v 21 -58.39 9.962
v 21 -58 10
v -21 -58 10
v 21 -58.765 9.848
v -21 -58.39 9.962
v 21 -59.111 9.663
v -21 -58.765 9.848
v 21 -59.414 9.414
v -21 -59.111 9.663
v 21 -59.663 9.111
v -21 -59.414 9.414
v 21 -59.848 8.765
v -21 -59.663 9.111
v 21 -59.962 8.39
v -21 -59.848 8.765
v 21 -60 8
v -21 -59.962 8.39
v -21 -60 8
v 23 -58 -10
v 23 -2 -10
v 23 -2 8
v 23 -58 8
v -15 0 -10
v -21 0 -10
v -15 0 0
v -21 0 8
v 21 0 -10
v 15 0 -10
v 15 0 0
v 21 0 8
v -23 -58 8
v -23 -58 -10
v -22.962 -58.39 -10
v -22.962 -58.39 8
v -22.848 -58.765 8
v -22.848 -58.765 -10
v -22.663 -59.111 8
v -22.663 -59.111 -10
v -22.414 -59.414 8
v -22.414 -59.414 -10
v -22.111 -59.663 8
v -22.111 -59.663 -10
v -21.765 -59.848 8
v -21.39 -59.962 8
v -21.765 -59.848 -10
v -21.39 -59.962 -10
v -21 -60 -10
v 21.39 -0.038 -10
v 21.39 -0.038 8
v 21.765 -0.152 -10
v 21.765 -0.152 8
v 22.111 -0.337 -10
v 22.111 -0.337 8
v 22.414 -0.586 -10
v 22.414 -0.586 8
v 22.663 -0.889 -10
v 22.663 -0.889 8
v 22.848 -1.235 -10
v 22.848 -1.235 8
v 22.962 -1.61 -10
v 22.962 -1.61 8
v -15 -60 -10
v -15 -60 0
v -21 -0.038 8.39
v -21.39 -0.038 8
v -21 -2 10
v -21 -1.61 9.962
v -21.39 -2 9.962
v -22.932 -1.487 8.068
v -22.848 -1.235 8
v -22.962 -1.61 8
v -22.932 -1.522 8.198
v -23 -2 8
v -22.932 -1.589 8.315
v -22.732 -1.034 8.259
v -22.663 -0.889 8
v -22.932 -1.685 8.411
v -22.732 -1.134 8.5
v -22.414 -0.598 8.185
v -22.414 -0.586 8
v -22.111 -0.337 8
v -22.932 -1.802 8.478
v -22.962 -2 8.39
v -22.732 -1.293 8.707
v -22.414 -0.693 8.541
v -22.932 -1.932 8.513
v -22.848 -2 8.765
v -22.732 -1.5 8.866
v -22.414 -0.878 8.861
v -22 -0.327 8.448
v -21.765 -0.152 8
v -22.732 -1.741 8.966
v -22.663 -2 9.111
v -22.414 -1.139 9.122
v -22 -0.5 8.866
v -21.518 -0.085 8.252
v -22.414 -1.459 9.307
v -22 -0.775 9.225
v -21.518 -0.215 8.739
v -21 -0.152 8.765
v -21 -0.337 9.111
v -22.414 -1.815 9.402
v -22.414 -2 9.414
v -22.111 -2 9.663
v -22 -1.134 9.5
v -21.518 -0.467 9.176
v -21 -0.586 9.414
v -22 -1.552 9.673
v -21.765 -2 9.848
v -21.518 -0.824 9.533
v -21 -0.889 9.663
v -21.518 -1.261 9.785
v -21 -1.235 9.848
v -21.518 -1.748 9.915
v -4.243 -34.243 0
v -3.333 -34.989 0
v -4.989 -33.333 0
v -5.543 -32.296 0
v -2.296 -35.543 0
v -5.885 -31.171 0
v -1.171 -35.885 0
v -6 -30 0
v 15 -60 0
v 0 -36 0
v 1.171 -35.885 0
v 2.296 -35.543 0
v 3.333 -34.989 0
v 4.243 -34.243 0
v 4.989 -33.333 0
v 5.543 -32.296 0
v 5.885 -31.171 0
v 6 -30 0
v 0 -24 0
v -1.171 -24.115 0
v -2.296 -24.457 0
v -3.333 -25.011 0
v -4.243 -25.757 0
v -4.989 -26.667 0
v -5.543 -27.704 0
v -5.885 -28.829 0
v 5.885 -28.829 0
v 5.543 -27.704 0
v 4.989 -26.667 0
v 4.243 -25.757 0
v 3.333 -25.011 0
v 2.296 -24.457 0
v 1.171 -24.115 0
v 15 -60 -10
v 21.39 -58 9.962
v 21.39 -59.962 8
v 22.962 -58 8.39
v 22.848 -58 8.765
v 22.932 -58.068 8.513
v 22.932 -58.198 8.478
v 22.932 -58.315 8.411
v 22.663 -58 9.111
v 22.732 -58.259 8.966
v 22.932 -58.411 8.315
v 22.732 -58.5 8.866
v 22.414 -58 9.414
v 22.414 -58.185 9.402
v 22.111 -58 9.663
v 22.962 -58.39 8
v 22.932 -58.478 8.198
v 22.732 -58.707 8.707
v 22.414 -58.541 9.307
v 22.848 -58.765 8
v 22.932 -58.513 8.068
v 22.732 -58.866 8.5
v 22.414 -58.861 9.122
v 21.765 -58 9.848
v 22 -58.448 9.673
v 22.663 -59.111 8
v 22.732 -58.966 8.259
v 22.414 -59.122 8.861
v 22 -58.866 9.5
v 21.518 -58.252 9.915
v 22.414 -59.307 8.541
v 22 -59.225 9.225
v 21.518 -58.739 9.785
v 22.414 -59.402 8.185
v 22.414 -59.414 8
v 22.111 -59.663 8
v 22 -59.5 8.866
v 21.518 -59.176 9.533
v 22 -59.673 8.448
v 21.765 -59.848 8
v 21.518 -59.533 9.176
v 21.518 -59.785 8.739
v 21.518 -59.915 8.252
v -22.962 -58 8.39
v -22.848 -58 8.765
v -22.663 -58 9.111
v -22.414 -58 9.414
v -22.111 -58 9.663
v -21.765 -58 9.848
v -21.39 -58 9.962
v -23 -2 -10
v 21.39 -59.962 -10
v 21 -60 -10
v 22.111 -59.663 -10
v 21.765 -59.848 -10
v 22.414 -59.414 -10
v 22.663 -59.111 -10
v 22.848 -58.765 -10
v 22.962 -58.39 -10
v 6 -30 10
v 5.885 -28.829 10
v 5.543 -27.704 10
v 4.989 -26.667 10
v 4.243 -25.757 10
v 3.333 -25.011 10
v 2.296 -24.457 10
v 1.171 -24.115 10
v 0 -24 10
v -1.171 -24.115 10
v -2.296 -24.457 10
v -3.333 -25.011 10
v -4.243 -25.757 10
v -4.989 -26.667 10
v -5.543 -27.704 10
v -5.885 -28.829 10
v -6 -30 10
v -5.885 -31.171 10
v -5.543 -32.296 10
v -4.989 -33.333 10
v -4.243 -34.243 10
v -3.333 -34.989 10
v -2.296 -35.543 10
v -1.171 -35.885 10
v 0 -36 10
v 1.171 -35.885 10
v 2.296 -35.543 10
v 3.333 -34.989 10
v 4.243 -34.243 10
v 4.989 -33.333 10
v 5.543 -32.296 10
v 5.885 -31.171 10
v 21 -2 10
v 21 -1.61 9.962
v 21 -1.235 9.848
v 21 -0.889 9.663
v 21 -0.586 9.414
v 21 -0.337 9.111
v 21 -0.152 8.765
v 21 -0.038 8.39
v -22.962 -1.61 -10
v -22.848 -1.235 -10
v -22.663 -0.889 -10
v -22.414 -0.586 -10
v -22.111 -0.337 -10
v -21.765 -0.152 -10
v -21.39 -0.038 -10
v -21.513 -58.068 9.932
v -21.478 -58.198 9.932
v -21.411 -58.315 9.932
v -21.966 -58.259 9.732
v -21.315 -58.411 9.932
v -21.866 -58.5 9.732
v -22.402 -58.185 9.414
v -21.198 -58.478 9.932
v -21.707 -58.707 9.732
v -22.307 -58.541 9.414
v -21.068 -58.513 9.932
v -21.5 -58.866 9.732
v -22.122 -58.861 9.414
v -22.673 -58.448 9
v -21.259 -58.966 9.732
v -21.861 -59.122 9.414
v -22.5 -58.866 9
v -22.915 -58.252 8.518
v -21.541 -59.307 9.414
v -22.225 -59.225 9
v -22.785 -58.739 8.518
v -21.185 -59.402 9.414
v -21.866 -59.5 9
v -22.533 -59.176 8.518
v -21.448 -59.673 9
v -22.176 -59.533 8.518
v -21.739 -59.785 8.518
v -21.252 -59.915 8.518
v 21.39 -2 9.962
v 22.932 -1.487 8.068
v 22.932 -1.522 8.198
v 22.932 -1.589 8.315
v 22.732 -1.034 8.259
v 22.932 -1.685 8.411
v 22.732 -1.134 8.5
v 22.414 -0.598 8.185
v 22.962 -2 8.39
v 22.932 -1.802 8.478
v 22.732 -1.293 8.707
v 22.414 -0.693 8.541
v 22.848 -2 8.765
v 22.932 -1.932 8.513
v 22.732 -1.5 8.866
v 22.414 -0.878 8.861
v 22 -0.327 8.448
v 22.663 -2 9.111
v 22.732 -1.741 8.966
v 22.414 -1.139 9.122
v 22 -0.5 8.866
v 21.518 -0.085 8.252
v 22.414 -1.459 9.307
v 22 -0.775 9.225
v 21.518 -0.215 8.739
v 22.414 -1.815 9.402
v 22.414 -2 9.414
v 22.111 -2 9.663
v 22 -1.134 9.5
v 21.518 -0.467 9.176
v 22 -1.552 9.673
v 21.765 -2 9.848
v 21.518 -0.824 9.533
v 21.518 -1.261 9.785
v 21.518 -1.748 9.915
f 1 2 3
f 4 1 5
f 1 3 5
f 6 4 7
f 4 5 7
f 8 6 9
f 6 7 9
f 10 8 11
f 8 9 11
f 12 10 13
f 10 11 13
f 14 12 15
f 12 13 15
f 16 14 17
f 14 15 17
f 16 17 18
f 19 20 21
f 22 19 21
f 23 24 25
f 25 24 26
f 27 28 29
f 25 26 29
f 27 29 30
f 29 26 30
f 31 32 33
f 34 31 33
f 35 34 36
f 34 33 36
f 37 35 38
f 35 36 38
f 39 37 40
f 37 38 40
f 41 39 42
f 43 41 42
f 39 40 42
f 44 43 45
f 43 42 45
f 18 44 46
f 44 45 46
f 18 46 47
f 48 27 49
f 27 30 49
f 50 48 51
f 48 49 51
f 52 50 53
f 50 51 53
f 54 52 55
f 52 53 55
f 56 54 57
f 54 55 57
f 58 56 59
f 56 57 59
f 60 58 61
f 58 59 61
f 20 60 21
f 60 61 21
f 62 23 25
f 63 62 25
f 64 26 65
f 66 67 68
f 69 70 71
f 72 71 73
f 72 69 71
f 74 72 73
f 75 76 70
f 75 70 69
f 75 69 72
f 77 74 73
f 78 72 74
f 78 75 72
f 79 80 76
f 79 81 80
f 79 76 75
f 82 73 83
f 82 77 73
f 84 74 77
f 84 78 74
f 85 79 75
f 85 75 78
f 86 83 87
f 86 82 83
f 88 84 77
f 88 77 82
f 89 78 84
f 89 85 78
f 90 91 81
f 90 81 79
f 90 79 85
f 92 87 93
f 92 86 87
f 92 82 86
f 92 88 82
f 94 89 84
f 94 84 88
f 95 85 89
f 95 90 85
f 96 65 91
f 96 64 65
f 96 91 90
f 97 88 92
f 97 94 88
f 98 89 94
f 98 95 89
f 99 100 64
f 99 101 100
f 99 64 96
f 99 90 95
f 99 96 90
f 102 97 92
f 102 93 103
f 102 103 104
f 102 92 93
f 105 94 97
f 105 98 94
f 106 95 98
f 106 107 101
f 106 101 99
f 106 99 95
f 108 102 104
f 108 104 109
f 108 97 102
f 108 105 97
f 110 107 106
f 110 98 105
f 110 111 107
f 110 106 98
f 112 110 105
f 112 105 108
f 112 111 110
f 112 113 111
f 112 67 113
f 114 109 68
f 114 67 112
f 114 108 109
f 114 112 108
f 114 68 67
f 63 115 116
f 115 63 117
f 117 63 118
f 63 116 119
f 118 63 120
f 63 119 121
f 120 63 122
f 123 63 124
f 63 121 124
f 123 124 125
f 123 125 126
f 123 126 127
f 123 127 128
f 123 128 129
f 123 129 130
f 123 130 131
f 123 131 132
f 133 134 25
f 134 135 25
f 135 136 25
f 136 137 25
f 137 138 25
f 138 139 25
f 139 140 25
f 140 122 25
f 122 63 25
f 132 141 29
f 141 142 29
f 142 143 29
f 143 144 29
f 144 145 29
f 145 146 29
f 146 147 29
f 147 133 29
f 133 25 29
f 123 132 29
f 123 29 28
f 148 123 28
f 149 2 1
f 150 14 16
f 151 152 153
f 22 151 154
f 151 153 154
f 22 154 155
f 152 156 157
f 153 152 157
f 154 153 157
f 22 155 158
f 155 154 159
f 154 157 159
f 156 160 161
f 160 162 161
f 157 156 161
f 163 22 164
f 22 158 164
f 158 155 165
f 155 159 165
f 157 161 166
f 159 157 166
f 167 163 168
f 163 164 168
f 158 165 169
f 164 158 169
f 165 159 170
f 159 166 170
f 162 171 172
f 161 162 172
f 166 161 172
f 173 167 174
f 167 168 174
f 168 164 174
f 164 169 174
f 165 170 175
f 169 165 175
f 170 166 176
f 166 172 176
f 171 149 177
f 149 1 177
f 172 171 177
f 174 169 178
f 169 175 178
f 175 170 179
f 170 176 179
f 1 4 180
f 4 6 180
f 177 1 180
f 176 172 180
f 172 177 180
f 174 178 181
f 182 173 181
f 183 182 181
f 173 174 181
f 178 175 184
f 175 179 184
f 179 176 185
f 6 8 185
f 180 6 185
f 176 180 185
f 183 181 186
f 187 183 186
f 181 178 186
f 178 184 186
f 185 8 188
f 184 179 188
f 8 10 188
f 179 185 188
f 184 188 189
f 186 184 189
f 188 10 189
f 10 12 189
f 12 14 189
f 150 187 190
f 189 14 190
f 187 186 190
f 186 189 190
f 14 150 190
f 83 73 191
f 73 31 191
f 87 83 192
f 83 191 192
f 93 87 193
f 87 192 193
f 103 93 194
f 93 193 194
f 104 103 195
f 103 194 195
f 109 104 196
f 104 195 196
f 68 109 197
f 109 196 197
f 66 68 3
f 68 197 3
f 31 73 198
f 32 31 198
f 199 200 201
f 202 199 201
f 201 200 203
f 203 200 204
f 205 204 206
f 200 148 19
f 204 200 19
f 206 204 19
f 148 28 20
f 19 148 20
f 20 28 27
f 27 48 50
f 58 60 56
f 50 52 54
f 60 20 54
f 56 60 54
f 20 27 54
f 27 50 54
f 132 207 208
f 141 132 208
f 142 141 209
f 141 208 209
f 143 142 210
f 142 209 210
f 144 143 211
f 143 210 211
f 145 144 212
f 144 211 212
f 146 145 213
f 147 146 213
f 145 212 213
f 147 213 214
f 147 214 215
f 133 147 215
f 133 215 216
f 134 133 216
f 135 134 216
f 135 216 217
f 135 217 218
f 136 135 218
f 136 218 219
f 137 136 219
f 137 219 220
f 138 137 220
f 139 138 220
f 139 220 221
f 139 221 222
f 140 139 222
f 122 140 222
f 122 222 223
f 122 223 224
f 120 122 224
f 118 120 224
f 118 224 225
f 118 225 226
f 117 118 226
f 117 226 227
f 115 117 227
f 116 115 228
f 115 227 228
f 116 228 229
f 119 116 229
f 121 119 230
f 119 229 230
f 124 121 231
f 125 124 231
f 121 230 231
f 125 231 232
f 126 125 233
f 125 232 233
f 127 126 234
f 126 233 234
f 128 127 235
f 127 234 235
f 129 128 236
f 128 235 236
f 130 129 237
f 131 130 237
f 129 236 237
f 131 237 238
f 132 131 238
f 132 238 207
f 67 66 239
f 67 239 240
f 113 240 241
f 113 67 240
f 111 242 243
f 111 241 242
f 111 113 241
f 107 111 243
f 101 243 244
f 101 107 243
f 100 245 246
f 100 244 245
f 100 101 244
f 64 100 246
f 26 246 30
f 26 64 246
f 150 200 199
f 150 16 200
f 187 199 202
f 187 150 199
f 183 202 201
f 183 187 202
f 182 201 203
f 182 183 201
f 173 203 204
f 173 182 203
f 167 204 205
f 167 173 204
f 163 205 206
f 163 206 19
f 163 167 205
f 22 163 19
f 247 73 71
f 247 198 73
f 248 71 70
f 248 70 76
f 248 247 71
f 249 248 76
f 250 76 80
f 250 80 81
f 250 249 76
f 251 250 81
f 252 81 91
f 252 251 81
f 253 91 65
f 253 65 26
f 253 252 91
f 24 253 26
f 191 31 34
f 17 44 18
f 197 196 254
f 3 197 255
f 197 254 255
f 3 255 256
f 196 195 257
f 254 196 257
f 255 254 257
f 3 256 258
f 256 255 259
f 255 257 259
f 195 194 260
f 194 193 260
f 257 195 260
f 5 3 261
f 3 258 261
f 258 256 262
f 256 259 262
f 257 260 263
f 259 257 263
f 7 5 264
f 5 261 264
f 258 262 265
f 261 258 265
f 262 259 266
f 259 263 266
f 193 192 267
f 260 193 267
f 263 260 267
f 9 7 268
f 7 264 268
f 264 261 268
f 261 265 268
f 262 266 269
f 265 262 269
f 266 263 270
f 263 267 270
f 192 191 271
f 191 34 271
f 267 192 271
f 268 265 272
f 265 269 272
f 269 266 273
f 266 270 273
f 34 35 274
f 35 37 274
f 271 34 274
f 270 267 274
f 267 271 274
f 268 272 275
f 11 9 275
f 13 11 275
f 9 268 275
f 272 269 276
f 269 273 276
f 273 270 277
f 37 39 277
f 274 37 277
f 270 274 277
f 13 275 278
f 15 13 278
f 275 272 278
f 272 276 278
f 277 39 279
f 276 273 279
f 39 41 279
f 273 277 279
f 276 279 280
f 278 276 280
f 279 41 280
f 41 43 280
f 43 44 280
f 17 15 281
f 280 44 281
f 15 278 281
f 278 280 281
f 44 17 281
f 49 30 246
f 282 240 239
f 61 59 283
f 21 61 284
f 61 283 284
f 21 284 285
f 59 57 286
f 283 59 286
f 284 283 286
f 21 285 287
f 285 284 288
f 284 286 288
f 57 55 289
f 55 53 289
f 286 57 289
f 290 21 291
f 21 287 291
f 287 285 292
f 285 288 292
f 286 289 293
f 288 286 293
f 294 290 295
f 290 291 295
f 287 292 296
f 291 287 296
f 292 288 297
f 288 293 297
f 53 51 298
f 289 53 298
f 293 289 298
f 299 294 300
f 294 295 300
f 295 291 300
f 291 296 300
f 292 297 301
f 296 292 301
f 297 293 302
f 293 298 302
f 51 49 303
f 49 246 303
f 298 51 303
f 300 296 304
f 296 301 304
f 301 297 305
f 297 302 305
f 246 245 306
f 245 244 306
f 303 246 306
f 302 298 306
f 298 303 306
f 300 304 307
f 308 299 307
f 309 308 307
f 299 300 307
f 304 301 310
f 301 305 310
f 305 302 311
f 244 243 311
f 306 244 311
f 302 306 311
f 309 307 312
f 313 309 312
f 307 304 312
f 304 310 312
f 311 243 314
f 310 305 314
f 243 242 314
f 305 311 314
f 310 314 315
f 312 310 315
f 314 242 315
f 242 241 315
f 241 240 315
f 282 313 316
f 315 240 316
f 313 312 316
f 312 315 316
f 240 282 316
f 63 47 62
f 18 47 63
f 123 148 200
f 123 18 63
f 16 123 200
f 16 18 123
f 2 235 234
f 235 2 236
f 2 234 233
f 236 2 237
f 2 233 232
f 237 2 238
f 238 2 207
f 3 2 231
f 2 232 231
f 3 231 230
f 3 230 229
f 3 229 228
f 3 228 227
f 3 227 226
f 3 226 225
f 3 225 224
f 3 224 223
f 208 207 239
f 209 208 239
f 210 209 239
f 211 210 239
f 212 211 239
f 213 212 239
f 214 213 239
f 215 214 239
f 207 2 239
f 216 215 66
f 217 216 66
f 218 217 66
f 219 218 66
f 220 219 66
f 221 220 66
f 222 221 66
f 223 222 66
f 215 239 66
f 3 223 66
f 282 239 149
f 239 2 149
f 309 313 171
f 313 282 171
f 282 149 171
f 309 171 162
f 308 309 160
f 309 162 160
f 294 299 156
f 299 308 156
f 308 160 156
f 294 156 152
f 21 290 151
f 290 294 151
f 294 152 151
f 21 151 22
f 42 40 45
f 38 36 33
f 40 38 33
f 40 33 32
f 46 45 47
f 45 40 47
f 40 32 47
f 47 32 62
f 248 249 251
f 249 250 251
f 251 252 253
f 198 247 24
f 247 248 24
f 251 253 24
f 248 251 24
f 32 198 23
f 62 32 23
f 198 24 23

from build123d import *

# Parameters (mm, degrees)
F1_DEPTH = 60
F2_R     = 6
F3_DEPTH = 25
F4_R     = 2


with BuildPart() as f1:
    # F0 (on Front) → F1 (new body)
    with BuildSketch(Plane.XZ):
        Polygon((-23, 10), (-23, -10), (-15, -10), (-15, 0), (15, 0), (15, -10), (23, -10), (23, 10), align=None)
    extrude(amount=F1_DEPTH)

    # F2 (on face) → F3 (cut)
    with BuildSketch(Plane.XY.offset(10)):
        with Locations((0, -30)):
            Circle(F2_R)
    extrude(amount=-F3_DEPTH, mode=Mode.SUBTRACT)

    # F4
    f4_edges = [f1.edges().sort_by_distance(p)[0] for p in [
        (0, 0, 10),
        (23, 0, 0),
        (-23, 0, 0),
        (-23, -60, 0),
        (-23, -30, 10),
        (0, -60, 10),
        (23, -30, 10),
        (23, -60, 0),
    ]]
    fillet(f4_edges, radius=F4_R)


solid = f1.part
